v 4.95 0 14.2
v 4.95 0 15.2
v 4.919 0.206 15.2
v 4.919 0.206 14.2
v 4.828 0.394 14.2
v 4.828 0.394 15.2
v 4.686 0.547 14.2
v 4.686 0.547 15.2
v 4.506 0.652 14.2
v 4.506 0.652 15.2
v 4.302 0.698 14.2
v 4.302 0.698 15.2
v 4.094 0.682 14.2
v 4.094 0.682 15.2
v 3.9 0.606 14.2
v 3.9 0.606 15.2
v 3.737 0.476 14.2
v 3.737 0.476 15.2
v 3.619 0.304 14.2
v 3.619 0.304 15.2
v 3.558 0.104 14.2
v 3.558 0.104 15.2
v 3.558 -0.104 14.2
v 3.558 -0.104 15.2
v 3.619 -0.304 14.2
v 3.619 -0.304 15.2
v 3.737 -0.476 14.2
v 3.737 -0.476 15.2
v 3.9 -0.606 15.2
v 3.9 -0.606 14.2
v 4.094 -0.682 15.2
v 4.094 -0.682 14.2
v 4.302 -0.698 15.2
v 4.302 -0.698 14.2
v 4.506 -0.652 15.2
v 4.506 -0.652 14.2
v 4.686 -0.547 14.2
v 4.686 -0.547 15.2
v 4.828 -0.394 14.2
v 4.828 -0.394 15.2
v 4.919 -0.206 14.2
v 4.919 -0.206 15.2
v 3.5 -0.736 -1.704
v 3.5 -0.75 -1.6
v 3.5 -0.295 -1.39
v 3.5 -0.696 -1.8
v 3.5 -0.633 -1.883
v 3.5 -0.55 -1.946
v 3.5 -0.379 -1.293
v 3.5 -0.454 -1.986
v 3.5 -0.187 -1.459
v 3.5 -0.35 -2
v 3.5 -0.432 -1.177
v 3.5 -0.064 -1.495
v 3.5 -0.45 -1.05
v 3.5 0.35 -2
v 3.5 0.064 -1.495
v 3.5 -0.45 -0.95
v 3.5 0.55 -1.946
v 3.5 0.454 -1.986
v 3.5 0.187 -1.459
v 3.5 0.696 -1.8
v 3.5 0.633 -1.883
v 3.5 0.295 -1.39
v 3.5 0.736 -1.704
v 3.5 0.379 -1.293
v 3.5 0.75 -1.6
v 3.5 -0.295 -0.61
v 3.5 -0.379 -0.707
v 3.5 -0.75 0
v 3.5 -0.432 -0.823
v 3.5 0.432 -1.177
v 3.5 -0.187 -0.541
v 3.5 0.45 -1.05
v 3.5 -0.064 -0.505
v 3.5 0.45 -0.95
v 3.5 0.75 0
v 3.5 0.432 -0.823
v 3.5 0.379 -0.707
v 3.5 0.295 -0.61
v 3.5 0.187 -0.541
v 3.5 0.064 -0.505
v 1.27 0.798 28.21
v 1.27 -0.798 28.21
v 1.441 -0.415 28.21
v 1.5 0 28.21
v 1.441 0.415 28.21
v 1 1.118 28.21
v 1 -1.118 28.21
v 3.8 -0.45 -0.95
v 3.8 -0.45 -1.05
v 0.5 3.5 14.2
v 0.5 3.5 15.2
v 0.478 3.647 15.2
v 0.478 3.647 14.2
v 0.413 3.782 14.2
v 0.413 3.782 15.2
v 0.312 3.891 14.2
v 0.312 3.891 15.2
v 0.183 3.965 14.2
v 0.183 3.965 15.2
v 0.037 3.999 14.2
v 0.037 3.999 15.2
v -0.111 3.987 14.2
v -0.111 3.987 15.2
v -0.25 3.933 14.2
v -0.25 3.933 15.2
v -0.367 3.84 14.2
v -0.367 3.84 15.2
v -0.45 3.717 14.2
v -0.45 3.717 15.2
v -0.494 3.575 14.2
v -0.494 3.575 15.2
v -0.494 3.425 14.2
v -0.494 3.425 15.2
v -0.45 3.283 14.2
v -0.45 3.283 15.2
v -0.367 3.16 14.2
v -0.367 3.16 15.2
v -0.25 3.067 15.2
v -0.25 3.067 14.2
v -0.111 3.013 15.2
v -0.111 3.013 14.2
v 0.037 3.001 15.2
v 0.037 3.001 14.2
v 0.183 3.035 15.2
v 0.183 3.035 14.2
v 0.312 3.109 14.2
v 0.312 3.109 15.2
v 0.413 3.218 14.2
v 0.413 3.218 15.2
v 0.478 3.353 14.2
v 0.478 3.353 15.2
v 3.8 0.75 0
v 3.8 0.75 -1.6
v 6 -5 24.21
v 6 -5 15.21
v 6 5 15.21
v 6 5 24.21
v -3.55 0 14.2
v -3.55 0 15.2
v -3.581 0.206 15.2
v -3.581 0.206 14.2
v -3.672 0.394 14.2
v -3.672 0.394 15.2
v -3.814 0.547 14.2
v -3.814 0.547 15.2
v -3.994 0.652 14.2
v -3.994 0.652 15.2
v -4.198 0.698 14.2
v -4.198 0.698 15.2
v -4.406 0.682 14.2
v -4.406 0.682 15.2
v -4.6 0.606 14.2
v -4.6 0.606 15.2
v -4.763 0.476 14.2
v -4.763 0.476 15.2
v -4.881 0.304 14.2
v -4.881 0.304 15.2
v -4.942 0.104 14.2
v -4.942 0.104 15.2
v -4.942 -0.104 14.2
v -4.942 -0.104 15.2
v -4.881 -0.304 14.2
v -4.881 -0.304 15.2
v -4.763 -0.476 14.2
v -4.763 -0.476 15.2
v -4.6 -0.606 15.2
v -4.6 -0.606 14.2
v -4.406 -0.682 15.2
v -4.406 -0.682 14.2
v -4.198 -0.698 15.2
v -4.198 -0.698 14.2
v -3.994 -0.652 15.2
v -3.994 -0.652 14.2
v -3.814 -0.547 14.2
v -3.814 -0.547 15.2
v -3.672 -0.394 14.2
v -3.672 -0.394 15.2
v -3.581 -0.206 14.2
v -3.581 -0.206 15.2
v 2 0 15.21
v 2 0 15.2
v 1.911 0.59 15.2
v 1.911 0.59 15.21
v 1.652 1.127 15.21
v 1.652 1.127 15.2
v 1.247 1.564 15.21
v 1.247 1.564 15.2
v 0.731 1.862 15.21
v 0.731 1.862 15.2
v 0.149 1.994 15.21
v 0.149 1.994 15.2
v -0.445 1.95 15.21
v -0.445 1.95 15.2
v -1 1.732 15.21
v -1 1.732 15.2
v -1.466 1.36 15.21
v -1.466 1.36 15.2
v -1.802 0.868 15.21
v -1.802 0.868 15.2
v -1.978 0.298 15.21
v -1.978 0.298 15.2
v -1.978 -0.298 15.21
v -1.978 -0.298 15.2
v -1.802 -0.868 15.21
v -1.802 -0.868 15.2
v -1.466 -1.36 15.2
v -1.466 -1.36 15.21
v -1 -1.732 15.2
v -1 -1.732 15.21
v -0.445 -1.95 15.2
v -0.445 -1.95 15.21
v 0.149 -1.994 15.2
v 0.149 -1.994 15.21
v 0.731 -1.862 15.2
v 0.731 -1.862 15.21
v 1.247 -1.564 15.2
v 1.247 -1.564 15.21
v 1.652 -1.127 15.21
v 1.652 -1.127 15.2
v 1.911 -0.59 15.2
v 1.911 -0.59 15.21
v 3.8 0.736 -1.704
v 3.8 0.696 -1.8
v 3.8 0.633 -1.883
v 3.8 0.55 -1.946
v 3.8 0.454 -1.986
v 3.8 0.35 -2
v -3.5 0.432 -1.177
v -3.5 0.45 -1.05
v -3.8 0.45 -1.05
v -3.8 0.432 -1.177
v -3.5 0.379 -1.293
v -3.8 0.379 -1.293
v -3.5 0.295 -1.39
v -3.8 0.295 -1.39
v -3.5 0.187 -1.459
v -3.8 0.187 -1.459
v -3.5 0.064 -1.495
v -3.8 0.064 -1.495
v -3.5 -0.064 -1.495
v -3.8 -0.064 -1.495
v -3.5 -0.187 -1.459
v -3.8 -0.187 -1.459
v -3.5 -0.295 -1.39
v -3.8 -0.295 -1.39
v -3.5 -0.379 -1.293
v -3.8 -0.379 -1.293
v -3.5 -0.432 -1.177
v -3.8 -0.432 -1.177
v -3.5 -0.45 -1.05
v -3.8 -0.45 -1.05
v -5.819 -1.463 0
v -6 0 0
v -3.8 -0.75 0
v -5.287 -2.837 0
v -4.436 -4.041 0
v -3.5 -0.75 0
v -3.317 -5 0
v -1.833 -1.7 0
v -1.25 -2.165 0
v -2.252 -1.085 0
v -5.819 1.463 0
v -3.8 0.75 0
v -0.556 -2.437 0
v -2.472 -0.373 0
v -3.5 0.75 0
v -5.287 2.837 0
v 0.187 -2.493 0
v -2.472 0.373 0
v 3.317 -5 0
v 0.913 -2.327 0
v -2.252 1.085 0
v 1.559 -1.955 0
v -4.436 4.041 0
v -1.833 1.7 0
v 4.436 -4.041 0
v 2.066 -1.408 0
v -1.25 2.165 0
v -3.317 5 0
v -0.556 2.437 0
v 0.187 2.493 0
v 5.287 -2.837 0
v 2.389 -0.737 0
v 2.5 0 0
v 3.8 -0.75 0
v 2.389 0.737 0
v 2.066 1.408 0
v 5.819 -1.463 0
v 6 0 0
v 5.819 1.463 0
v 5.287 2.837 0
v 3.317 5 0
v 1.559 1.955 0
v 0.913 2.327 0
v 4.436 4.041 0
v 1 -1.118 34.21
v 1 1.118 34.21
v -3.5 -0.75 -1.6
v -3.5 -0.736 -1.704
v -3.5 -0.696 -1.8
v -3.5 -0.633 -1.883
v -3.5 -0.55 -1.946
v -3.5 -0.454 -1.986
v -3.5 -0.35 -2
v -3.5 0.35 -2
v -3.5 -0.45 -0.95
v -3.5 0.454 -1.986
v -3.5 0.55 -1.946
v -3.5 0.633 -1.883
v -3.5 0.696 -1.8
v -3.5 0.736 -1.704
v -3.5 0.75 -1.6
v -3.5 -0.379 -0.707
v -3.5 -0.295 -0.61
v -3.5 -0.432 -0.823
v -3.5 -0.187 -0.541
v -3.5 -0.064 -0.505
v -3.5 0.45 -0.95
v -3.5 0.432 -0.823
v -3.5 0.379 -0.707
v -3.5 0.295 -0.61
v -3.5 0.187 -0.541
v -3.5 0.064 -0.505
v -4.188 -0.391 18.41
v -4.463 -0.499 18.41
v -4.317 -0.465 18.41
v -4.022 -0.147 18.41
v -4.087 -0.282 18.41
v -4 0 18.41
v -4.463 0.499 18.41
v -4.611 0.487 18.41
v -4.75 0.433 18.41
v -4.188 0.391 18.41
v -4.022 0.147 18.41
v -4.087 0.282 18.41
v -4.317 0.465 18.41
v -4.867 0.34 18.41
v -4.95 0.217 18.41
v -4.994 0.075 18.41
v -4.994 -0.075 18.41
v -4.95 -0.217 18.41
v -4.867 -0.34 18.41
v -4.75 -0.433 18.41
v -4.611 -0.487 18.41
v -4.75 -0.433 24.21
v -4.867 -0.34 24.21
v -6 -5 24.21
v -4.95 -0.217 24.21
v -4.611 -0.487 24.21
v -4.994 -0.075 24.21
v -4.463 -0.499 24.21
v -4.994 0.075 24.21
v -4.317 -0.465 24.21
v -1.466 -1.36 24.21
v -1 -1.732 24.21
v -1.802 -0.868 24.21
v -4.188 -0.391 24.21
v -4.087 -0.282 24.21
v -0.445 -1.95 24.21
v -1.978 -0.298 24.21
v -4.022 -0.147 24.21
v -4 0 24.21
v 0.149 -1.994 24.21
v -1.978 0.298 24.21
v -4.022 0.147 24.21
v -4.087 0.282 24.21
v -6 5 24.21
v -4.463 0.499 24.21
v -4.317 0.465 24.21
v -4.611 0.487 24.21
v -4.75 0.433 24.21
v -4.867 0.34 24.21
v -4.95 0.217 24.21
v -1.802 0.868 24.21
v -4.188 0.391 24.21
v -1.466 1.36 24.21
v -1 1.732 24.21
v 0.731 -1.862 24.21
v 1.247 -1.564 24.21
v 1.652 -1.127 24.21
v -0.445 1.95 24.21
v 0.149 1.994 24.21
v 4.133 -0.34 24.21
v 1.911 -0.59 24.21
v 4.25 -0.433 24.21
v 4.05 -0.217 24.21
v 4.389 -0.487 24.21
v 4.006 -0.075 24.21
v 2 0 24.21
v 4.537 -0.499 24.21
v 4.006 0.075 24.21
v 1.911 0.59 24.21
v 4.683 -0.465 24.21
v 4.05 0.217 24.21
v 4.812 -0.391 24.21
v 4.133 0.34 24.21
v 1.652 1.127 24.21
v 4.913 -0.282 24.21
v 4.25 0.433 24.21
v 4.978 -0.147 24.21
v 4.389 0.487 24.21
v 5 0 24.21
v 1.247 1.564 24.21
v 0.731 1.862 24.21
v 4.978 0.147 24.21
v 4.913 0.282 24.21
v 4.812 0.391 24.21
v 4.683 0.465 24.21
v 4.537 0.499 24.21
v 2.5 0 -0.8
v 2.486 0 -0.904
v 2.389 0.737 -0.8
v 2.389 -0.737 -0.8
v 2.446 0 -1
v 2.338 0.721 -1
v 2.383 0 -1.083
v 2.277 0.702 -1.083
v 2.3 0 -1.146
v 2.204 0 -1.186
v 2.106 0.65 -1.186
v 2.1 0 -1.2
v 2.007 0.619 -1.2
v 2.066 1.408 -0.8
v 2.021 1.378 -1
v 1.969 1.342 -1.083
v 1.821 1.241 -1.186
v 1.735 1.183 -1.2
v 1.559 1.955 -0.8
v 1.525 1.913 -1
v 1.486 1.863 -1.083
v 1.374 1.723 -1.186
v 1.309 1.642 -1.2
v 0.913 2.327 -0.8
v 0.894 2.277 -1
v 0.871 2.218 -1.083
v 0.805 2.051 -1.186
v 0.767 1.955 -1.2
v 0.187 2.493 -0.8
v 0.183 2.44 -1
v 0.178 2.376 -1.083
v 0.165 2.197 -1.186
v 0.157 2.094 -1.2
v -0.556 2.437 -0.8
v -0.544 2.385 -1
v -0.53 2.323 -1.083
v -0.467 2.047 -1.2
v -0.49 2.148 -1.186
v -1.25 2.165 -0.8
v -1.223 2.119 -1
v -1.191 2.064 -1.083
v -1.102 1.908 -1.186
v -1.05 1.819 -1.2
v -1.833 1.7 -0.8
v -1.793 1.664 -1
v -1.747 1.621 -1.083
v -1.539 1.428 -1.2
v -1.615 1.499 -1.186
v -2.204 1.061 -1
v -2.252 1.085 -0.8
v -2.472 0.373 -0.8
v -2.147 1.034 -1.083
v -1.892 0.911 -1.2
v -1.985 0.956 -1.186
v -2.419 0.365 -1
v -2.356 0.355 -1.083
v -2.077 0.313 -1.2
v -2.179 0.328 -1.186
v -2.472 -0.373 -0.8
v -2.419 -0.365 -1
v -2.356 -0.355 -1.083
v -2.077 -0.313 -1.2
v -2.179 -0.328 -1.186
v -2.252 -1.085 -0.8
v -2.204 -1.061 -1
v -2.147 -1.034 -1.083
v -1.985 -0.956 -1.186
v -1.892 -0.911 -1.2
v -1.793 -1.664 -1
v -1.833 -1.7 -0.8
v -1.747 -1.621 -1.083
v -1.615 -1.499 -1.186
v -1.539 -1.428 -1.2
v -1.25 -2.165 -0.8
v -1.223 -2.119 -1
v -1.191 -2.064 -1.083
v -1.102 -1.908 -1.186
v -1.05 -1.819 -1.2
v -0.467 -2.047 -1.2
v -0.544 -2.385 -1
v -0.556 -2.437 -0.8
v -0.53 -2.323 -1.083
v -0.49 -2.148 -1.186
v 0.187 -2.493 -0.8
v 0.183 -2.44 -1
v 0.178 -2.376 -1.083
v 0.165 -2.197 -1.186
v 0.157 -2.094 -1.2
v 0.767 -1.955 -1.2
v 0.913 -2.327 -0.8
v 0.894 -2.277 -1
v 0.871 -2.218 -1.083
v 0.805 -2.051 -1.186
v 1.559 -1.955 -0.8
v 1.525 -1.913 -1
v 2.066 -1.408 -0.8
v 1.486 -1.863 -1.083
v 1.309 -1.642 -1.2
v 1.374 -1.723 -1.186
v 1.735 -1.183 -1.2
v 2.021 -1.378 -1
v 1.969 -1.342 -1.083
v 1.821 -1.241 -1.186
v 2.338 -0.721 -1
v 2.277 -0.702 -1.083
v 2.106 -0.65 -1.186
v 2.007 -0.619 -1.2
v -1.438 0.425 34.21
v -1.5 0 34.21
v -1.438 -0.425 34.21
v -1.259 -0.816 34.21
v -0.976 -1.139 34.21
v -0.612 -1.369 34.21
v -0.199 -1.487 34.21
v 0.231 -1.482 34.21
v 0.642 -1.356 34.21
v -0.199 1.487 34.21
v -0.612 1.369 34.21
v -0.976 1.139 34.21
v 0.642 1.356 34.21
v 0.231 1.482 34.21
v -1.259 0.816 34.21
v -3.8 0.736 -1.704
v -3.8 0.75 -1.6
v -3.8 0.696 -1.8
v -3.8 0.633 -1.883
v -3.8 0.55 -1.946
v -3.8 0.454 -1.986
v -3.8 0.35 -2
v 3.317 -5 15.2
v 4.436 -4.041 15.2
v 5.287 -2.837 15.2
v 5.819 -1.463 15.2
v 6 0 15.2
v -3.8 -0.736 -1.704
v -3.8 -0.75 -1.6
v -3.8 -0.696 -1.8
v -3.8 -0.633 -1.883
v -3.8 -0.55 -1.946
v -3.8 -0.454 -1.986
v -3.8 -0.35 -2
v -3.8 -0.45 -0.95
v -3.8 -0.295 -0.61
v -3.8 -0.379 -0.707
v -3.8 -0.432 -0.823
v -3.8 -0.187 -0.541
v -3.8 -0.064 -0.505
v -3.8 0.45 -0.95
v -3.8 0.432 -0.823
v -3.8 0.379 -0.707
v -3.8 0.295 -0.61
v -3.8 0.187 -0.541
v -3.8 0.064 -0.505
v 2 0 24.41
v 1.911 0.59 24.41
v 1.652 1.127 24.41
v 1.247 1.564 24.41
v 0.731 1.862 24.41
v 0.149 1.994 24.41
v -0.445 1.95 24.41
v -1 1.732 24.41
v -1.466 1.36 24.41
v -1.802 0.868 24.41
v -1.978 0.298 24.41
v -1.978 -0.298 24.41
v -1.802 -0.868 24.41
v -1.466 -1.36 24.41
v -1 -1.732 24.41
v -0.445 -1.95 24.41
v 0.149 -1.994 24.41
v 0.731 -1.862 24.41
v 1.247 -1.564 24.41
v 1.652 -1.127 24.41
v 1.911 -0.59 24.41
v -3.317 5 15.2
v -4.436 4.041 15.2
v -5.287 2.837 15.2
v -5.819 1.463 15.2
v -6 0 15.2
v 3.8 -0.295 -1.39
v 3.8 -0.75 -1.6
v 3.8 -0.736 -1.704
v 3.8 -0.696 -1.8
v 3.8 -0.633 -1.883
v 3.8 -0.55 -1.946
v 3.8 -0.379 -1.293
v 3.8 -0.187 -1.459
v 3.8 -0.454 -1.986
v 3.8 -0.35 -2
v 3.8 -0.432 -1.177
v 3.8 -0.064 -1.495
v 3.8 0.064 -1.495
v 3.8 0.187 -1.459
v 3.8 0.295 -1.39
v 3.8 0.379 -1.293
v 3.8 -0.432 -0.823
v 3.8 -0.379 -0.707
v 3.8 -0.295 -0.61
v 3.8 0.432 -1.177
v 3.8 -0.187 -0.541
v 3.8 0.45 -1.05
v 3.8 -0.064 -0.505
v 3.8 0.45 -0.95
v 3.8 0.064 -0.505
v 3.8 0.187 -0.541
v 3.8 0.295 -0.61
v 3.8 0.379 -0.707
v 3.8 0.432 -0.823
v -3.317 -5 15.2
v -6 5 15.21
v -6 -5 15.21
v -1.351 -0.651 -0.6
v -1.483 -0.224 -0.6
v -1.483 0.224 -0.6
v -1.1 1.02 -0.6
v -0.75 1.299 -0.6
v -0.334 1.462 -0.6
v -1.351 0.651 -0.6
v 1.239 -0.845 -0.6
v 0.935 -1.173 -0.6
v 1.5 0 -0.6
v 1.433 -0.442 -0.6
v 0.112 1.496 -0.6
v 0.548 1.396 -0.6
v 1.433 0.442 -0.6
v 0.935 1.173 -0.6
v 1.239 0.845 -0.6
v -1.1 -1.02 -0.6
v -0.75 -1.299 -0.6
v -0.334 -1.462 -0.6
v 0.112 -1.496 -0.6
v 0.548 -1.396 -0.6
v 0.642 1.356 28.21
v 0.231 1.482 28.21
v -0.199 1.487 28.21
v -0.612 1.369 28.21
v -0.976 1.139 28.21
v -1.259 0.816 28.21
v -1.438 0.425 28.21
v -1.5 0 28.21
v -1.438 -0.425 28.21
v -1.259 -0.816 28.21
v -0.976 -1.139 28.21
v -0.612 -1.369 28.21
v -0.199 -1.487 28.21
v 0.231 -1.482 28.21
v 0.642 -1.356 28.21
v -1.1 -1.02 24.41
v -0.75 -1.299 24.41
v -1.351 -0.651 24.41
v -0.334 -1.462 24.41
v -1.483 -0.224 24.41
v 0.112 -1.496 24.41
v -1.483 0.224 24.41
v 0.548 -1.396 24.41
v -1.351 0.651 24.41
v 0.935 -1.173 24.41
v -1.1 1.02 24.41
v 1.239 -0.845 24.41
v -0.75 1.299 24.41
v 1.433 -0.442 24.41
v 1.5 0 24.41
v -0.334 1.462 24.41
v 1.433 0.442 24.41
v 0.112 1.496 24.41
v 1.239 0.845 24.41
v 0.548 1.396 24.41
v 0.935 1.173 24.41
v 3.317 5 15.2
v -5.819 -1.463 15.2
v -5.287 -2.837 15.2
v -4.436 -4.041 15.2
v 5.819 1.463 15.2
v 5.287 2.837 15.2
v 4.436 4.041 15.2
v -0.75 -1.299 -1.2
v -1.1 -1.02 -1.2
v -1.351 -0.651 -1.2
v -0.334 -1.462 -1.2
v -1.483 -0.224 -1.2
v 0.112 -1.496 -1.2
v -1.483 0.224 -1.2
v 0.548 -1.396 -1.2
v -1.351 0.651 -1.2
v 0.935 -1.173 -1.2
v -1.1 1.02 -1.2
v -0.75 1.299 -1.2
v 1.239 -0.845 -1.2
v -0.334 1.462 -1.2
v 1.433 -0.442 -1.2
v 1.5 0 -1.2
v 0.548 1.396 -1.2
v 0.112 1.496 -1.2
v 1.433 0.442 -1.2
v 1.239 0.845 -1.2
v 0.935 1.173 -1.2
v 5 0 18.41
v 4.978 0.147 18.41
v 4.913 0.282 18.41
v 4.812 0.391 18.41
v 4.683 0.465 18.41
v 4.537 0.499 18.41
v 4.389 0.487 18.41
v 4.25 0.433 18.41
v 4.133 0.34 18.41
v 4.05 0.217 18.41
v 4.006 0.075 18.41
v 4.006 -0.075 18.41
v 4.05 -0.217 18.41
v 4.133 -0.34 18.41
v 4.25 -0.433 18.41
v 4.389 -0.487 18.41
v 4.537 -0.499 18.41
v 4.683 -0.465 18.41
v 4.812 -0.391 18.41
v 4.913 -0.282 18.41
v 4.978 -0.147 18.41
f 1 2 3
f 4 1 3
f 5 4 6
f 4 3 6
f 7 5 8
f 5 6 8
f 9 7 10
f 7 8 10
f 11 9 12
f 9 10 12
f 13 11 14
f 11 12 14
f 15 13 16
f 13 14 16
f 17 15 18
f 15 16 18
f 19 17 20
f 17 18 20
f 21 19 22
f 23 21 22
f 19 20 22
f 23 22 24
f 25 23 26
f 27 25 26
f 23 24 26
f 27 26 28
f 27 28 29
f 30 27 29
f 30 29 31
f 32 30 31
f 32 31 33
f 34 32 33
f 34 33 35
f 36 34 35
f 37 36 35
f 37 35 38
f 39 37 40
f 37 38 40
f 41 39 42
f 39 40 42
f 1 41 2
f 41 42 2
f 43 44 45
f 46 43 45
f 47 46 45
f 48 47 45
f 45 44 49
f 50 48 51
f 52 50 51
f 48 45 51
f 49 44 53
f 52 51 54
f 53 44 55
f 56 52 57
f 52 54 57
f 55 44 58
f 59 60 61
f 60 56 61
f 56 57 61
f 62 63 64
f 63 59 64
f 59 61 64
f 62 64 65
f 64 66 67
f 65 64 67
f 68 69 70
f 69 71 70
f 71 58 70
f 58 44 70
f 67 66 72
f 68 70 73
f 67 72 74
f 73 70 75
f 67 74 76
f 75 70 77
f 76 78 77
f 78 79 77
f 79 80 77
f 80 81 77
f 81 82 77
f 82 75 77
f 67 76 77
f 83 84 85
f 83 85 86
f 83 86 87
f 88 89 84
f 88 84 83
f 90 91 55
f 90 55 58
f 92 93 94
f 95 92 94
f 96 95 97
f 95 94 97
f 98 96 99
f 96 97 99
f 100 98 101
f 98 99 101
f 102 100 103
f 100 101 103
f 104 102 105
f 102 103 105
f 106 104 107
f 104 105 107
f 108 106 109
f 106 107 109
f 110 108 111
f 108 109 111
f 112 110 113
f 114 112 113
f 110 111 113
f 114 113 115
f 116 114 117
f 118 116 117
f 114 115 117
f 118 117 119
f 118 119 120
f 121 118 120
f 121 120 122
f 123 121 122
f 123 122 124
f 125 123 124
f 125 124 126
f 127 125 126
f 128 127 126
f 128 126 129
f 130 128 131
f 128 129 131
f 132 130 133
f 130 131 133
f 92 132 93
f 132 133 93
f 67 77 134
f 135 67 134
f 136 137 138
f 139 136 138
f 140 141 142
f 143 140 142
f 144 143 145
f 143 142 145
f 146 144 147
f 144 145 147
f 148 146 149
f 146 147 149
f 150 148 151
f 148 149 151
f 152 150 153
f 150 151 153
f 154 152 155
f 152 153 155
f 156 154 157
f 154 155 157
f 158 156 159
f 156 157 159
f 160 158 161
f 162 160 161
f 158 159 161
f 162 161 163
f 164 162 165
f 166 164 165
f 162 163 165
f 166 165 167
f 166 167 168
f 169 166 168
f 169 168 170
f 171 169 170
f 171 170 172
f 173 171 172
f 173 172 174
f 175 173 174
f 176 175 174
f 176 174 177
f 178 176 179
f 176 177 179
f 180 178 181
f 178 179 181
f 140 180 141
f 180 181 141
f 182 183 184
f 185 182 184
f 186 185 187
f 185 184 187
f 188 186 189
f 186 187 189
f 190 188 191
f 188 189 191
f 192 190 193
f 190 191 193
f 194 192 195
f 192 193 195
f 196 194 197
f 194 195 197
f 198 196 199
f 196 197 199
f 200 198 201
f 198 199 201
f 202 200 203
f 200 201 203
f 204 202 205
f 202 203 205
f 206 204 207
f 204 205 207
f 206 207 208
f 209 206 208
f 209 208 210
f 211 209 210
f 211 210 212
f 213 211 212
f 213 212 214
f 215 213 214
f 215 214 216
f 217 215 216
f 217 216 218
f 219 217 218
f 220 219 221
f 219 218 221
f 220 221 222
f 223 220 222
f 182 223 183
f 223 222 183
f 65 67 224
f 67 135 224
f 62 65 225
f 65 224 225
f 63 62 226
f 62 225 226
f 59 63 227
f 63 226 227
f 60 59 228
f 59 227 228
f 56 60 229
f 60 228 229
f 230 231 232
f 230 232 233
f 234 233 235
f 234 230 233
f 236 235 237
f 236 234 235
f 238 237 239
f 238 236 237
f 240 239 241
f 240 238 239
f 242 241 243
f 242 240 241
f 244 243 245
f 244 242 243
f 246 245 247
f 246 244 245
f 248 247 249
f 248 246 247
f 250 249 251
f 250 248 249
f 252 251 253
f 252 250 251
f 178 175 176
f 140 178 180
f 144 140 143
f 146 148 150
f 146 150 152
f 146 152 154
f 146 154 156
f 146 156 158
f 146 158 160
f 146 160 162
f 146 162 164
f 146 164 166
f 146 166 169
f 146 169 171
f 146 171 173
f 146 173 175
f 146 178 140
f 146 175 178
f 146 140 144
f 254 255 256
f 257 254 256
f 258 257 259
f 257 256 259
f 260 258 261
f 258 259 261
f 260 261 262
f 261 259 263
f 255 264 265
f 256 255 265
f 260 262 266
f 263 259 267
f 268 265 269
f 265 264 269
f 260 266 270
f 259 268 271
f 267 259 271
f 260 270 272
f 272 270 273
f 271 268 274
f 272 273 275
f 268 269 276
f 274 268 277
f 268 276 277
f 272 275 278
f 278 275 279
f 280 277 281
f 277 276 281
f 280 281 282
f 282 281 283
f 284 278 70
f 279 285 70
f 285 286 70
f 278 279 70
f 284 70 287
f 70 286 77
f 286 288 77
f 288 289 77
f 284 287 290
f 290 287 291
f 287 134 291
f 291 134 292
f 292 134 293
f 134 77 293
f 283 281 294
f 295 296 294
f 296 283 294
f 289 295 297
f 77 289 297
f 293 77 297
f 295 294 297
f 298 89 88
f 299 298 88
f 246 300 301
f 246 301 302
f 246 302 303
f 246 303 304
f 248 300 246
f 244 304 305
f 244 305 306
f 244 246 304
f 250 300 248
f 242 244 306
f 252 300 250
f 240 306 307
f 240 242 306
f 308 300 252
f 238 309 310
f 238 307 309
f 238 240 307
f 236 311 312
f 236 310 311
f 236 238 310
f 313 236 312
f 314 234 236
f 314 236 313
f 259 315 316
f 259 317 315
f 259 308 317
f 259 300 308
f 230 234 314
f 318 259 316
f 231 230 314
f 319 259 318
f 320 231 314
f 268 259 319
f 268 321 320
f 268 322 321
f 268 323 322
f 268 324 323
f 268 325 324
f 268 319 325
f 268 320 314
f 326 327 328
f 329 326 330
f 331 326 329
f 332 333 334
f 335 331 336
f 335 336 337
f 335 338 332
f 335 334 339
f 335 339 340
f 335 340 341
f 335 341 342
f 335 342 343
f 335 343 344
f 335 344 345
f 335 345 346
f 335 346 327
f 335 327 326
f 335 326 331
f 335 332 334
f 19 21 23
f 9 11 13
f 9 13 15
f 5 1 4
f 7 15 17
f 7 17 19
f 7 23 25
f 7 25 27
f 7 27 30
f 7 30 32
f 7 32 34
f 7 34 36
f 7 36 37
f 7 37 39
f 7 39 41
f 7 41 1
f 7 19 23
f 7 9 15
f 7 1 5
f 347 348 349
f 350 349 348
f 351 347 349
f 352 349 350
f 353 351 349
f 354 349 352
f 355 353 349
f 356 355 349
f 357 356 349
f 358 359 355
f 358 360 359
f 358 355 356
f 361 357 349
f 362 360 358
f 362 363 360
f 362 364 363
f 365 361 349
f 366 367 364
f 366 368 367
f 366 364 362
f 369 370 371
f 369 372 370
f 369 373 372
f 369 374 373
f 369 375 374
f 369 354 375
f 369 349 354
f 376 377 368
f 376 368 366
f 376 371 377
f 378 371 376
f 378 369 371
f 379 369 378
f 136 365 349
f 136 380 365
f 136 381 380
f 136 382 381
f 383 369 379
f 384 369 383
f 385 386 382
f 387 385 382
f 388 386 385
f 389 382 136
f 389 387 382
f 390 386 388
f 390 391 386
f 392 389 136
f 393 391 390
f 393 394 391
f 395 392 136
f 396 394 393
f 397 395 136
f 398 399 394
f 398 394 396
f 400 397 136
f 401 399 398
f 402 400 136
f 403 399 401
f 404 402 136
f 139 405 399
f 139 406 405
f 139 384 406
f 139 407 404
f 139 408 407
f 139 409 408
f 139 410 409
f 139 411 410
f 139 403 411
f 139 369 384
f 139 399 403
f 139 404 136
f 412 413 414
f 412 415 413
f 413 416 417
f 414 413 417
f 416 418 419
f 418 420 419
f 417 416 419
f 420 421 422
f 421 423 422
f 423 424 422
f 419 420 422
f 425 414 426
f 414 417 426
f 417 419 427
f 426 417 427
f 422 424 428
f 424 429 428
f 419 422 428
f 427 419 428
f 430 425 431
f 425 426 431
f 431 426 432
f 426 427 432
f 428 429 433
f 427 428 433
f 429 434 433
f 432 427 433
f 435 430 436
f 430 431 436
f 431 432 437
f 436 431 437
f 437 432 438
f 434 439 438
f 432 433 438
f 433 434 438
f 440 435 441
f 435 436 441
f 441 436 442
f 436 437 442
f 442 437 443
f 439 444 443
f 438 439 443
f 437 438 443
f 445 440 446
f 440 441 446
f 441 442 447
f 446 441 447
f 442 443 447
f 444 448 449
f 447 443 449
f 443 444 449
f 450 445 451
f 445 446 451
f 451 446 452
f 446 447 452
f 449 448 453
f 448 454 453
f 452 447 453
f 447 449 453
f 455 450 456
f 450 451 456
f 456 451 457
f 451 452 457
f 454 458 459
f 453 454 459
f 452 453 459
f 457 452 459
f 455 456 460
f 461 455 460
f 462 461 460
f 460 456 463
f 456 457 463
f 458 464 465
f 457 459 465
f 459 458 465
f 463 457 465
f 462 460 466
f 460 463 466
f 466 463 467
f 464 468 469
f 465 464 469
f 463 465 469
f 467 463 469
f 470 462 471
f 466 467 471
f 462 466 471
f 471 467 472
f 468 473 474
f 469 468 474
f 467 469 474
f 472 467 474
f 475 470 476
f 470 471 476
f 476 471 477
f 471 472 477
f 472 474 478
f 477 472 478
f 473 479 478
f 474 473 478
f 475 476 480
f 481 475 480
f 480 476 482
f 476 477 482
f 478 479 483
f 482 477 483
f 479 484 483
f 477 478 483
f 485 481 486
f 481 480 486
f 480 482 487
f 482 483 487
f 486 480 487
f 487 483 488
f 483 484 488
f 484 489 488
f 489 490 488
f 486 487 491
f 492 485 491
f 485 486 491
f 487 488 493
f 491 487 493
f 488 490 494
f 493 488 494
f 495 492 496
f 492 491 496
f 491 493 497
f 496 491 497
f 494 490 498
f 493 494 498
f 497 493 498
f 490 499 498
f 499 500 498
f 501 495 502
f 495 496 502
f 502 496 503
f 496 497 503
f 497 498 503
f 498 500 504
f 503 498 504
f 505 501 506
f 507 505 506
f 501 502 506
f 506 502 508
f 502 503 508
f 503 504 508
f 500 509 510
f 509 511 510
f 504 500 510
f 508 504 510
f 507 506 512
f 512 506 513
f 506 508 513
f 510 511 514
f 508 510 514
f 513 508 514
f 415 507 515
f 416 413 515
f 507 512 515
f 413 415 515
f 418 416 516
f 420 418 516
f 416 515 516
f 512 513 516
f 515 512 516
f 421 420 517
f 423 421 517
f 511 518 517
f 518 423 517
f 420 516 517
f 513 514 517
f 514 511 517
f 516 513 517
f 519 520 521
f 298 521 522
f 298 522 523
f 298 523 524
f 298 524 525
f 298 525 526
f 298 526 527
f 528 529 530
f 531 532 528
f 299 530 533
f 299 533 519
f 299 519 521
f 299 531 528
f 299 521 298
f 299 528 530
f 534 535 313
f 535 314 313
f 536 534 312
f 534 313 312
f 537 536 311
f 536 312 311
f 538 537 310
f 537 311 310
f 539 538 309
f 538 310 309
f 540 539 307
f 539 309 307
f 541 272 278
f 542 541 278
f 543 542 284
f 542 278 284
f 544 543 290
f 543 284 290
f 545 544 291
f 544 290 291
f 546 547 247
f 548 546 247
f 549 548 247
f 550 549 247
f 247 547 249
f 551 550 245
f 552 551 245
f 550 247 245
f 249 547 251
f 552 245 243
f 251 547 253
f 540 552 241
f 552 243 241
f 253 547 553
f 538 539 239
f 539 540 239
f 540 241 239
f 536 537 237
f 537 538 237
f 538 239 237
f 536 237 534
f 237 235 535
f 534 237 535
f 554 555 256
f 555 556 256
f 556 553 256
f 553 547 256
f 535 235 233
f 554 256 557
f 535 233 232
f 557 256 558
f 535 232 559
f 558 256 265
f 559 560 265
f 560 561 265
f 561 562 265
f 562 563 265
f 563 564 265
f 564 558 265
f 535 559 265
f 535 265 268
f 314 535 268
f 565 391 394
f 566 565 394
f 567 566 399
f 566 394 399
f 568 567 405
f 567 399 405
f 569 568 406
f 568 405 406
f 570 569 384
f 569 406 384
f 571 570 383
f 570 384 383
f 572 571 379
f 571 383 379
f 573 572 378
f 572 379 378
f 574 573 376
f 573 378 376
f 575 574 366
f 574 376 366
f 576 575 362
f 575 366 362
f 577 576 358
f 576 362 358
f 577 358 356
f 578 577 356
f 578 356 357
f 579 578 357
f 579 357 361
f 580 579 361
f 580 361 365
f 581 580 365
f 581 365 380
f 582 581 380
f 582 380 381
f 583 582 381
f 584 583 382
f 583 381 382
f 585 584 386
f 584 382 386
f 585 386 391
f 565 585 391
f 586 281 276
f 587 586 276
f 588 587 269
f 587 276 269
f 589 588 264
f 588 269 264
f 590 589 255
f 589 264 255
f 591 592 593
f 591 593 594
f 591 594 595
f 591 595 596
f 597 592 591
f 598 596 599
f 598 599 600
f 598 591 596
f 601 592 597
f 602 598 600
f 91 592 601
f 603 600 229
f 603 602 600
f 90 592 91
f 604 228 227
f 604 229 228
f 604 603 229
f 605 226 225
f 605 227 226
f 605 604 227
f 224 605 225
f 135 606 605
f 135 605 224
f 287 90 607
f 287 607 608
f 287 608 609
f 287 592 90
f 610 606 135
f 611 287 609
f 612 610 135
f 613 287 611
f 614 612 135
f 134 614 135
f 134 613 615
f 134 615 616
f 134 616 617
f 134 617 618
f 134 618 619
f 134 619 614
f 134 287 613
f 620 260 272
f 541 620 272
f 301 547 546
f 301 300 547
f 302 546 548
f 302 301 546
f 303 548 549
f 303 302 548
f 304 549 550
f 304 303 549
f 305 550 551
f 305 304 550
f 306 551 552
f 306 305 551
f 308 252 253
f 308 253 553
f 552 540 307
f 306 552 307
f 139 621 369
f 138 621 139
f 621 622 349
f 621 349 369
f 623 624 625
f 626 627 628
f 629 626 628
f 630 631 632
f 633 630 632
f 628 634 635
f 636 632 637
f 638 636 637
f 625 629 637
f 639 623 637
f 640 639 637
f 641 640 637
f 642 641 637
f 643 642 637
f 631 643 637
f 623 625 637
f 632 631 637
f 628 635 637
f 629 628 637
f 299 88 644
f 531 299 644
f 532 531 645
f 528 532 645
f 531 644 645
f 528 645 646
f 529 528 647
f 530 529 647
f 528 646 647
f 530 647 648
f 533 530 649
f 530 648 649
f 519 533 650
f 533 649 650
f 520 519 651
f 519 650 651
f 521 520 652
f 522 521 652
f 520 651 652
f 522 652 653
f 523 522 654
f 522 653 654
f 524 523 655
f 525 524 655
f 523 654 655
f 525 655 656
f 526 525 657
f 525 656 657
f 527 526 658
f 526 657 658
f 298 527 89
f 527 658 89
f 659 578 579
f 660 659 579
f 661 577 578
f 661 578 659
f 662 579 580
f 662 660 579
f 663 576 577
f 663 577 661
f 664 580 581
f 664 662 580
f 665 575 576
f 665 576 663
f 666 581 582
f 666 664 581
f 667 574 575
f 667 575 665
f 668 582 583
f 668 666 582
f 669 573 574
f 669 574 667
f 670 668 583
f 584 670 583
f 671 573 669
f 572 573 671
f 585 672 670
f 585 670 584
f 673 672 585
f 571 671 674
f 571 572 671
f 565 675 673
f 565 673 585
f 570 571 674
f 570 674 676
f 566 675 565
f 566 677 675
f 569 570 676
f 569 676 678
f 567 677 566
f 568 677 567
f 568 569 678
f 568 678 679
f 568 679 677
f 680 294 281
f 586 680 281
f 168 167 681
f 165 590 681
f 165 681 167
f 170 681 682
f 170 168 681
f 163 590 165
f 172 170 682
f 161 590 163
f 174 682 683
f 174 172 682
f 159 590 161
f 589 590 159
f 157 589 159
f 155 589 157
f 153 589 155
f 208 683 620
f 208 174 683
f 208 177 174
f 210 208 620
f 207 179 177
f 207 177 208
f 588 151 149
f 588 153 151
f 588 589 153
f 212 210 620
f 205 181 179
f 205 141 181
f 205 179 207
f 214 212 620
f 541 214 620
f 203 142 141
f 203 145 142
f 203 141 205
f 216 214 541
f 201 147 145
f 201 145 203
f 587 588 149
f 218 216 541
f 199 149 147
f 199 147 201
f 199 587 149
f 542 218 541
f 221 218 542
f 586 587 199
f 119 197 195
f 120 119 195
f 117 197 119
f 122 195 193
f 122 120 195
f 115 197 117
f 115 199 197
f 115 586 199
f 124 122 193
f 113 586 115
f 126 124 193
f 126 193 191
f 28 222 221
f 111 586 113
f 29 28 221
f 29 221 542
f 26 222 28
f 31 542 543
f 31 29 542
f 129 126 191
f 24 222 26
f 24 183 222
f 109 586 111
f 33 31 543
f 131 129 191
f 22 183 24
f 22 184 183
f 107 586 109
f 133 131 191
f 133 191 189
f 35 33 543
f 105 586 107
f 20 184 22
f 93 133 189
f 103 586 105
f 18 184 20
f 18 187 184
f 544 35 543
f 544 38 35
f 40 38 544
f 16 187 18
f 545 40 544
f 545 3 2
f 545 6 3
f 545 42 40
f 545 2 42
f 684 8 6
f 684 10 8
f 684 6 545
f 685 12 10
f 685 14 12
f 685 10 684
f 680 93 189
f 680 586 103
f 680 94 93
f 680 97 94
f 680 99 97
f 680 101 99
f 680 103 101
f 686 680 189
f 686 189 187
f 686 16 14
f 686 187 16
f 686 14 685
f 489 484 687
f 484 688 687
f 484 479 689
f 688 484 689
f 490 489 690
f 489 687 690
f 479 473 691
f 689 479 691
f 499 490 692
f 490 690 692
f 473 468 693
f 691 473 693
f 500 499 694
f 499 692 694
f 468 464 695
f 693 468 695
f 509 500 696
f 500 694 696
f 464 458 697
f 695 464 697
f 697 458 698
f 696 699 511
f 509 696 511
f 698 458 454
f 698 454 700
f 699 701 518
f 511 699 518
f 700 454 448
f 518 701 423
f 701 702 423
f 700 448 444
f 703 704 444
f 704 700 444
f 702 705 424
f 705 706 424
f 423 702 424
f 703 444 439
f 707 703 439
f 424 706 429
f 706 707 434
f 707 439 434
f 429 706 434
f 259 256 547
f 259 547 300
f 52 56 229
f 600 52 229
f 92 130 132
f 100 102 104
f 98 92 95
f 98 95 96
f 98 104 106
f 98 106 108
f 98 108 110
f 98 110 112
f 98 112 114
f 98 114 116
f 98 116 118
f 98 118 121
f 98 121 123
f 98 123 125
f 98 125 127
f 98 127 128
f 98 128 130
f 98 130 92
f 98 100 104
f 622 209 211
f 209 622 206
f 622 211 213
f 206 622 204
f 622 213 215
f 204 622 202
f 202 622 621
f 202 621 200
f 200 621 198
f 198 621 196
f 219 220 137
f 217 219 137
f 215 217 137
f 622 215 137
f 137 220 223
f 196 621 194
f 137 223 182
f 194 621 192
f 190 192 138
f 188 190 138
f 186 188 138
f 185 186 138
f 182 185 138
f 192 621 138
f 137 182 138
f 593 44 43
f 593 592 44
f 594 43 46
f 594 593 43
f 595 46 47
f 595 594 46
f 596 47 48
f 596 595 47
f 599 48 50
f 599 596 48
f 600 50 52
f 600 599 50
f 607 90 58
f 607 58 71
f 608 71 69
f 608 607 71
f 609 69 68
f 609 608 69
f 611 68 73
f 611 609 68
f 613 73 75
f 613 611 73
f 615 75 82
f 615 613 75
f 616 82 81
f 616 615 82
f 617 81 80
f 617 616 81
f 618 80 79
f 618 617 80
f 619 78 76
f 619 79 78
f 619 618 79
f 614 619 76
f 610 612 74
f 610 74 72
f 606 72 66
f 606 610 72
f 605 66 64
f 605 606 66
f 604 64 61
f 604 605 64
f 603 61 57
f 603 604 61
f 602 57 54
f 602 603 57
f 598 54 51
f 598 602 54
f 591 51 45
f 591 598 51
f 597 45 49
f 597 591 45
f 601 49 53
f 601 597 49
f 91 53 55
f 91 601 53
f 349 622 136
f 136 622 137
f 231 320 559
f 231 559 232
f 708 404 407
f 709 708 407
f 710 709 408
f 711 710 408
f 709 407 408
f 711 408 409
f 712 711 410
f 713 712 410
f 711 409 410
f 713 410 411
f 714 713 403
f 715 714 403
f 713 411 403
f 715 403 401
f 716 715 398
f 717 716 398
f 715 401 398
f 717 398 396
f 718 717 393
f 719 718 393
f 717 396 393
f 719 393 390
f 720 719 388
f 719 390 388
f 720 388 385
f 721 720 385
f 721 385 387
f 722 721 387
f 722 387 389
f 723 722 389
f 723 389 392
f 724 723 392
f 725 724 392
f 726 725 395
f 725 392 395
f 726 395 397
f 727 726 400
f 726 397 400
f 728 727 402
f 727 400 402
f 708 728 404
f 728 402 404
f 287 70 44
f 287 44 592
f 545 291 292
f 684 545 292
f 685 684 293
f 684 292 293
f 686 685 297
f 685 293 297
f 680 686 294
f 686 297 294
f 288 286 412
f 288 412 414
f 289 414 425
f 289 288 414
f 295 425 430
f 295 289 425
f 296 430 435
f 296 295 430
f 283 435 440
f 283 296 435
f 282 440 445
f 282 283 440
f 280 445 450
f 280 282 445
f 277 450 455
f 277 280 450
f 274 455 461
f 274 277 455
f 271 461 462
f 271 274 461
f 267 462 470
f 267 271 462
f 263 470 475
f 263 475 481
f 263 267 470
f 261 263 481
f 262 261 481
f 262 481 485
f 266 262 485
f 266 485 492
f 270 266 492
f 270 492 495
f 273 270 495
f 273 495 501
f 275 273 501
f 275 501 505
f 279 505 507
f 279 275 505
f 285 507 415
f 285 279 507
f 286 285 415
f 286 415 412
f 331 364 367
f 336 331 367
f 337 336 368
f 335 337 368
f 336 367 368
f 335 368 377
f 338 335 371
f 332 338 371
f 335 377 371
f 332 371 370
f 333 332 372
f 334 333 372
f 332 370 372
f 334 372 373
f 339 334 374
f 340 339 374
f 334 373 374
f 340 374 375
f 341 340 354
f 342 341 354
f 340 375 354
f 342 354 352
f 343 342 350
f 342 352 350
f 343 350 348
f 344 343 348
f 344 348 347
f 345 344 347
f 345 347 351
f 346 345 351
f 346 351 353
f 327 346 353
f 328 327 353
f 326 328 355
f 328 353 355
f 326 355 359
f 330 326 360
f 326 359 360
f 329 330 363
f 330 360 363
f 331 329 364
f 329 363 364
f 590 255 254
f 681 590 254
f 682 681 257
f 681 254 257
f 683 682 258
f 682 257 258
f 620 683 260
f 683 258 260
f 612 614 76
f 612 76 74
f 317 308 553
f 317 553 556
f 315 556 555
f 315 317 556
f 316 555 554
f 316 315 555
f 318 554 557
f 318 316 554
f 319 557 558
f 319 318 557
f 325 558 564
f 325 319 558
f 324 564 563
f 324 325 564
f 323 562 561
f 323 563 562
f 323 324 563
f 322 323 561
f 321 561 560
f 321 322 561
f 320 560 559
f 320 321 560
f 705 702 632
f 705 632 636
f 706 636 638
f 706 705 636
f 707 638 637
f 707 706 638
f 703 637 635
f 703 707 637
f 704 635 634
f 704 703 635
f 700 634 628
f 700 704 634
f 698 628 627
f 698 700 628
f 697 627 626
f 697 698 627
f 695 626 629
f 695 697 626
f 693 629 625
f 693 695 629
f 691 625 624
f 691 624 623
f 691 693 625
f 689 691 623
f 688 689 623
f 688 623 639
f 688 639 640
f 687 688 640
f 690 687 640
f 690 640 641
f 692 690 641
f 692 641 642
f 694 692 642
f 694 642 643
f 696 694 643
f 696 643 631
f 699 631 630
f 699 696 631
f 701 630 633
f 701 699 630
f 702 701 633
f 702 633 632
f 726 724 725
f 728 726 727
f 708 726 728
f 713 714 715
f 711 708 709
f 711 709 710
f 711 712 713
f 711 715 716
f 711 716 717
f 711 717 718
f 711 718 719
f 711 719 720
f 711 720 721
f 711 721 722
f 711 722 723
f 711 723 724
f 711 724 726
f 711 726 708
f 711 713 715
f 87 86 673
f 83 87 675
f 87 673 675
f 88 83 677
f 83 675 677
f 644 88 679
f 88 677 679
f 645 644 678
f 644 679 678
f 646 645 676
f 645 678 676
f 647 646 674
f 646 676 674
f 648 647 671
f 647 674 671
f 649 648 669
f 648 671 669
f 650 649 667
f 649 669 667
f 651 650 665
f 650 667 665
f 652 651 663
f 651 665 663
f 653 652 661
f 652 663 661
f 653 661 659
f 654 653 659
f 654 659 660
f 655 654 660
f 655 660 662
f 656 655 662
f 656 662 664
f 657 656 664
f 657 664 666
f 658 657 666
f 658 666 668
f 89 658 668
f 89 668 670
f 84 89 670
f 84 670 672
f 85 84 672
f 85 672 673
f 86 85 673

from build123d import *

# Parameters (mm, degrees)
SKETCH_1_W          = 0.3
SKETCH_1_H          = 1.5
SKETCH_1_R          = 2.5
SKETCH_1_R_2        = 1.5
EXTRUDE_1_DEPTH     = 15.2
SKETCH_1_4_W        = 0.3
SKETCH_1_4_H        = 1.5
EXTRUDE_2_DEPTH     = 2
CUT_EXTRUDE_2_DEPTH = 19.763794925
FILLET_1_R          = 0.4
SKETCH_1_5_R        = 2.5
SKETCH_1_5_R_2      = 1.5
EXTRUDE_3_DEPTH     = 1.2
CUT_EXTRUDE_START   = -1.2
SKETCH_1_7_R        = 1.5
CUT_EXTRUDE_1_DEPTH = 0.6
FILLET_2_R          = 0.4
SKETCH_3_R          = 2
EXTRUDE_4_DEPTH     = 0.5
SKETCH_3_3_R        = 0.5
EXTRUDE_5_DEPTH     = 3
SKETCH_4_R          = 0.7
SKETCH_4_R_2        = 0.5
CUT_EXTRUDE_3_DEPTH = 1
EXTRUDE_START       = 0.01
SKETCH_5_W          = 12
SKETCH_5_H          = 10
EXTRUDE_6_DEPTH     = 9
SKETCH_6_R          = 2
EXTRUDE_7_DEPTH     = 0.2
SKETCH_6_4_R        = 1.5
EXTRUDE_8_DEPTH     = 4
EXTRUDE_START_2     = 4
EXTRUDE_9_DEPTH     = 6
SKETCH_7_R          = 0.5
CUT_EXTRUDE_5_DEPTH = 5.8


with BuildPart() as part:
    # 草图1 → 凸台-拉伸1 (new body)
    # profile 1 of 5: a face of its own
    with BuildSketch(Plane.XY):
        with BuildLine():
            ThreePointArc((-6, 0), (-5.286764074, -2.837274331), (-3.31662479, -5))
            Line((-3.31662479, -5), (3.31662479, -5))
            ThreePointArc((3.31662479, -5), (5.286764074, -2.837274331), (6, 0))
            ThreePointArc((6, 0), (5.286764074, 2.837274331), (3.31662479, 5))
            Line((3.31662479, 5), (-3.31662479, 5))
            ThreePointArc((-3.31662479, 5), (-5.286764074, 2.837274331), (-6, 0))
        make_face()
        with Locations((-3.65, 0)):
            Rectangle(SKETCH_1_W, SKETCH_1_H, mode=Mode.SUBTRACT)
        Circle(SKETCH_1_R, mode=Mode.SUBTRACT)
        with Locations((3.65, 0)):
            Rectangle(SKETCH_1_W, SKETCH_1_H, mode=Mode.SUBTRACT)
    # profile 2 of 5: a face of its own
    with BuildSketch(Plane.XY):
        Circle(SKETCH_1_R)
        Circle(SKETCH_1_R_2, mode=Mode.SUBTRACT)
    # profile 3 of 5: a face of its own
    with BuildSketch(Plane.XY):
        Circle(SKETCH_1_R_2)
    # profile 4 of 5: a face of its own
    with BuildSketch(Plane.XY):
        with Locations((3.65, 0)):
            Rectangle(SKETCH_1_W, SKETCH_1_H)
    # profile 5 of 5: a face of its own
    with BuildSketch(Plane.XY):
        with Locations((-3.65, 0)):
            Rectangle(SKETCH_1_W, SKETCH_1_H)
    extrude(amount=EXTRUDE_1_DEPTH)

    # 草图1<4> → 凸台-拉伸2 (add)
    with BuildSketch(Plane.XY):
        with Locations((3.65, 0)):
            Rectangle(SKETCH_1_4_W, SKETCH_1_4_H)
        with Locations((-3.65, 0)):
            Rectangle(SKETCH_1_4_W, SKETCH_1_4_H)
    extrude(amount=-EXTRUDE_2_DEPTH)

    # 草图2 → 切除-拉伸2 (cut, through all)
    with BuildSketch(Plane(origin=(3.8, 0, 0), x_dir=(0, 0, -1), z_dir=(1, 0, 0))):
        with BuildLine():
            Line((0.95, 0.45), (1.05, 0.45))
            ThreePointArc((1.05, 0.45), (1.5, 0), (1.05, -0.45))
            Line((1.05, -0.45), (0.95, -0.45))
            ThreePointArc((0.95, -0.45), (0.5, 0), (0.95, 0.45))
        make_face()
    extrude(amount=-CUT_EXTRUDE_2_DEPTH, mode=Mode.SUBTRACT)

    # 圆角1
    fillet_1_edges = [part.edges().sort_by_distance(p)[0] for p in [
        (3.65, -0.75, -2),
        (3.65, 0.75, -2),
        (-3.65, -0.75, -2),
        (-3.65, 0.75, -2),
    ]]
    fillet(fillet_1_edges, radius=FILLET_1_R)

    # 草图1<5> → 凸台-拉伸3 (add)
    # profile 1 of 2: a face of its own
    with BuildSketch(Plane.XY):
        Circle(SKETCH_1_5_R)
        Circle(SKETCH_1_5_R_2, mode=Mode.SUBTRACT)
    # profile 2 of 2: a face of its own
    with BuildSketch(Plane.XY):
        Circle(SKETCH_1_5_R_2)
    extrude(amount=-EXTRUDE_3_DEPTH)

    # 草图1<7> → 切除-拉伸1 (cut)
    with BuildSketch(Plane.XY.offset(CUT_EXTRUDE_START)):
        Circle(SKETCH_1_7_R)
    extrude(amount=CUT_EXTRUDE_1_DEPTH, mode=Mode.SUBTRACT)

    # 圆角2
    fillet_2_edges = [part.edges().sort_by_distance(p)[0] for p in [
        (-2.5, 0, -1.2),
    ]]
    fillet(fillet_2_edges, radius=FILLET_2_R)

    # 草图3 → 凸台-拉伸4 (add)
    with BuildSketch(Plane.XY.offset(15.2)):
        Circle(SKETCH_3_R)
    extrude(amount=EXTRUDE_4_DEPTH)

    # 草图3<3> → 凸台-拉伸5 (add)
    with BuildSketch(Plane.XY.offset(15.2)):
        Circle(SKETCH_3_3_R)
    extrude(amount=EXTRUDE_5_DEPTH)

    # 草图4 → 切除-拉伸3 (cut)
    with BuildSketch(Plane.XY.offset(15.2)):
        with Locations((-4.25, 0)):
            Circle(SKETCH_4_R)
        with Locations((4.25, 0)):
            Circle(SKETCH_4_R)
        with Locations((0, 3.5)):
            Circle(SKETCH_4_R_2)
    extrude(amount=-CUT_EXTRUDE_3_DEPTH, mode=Mode.SUBTRACT)

    # 草图5 → 凸台-拉伸6 (add)
    with BuildSketch(Plane.XY.offset(15.2).offset(EXTRUDE_START)):
        Rectangle(SKETCH_5_W, SKETCH_5_H)
    extrude(amount=EXTRUDE_6_DEPTH)

    # 草图6 → 凸台-拉伸7 (add)
    with BuildSketch(Plane.XY.offset(24.21)):
        Circle(SKETCH_6_R)
    extrude(amount=EXTRUDE_7_DEPTH)

    # 草图6<4> → 凸台-拉伸8 (add)
    with BuildSketch(Plane.XY.offset(24.21)):
        Circle(SKETCH_6_4_R)
    extrude(amount=EXTRUDE_8_DEPTH)

    # 草图6<5> → 凸台-拉伸9 (add)
    with BuildSketch(Plane.XY.offset(24.21).offset(EXTRUDE_START_2)):
        with BuildLine():
            Line((1, -1.118033989), (1, 1.118033989))
            ThreePointArc((1, 1.118033989), (-1.5, 0), (1, -1.118033989))
        make_face()
    extrude(amount=EXTRUDE_9_DEPTH)

    # 草图7 → 切除-拉伸5 (cut)
    with BuildSketch(Plane.XY.offset(24.21)):
        with Locations((-4.5, 0)):
            Circle(SKETCH_7_R)
        with Locations((4.5, 0)):
            Circle(SKETCH_7_R)
    extrude(amount=-CUT_EXTRUDE_5_DEPTH, mode=Mode.SUBTRACT)


solid = part.part
